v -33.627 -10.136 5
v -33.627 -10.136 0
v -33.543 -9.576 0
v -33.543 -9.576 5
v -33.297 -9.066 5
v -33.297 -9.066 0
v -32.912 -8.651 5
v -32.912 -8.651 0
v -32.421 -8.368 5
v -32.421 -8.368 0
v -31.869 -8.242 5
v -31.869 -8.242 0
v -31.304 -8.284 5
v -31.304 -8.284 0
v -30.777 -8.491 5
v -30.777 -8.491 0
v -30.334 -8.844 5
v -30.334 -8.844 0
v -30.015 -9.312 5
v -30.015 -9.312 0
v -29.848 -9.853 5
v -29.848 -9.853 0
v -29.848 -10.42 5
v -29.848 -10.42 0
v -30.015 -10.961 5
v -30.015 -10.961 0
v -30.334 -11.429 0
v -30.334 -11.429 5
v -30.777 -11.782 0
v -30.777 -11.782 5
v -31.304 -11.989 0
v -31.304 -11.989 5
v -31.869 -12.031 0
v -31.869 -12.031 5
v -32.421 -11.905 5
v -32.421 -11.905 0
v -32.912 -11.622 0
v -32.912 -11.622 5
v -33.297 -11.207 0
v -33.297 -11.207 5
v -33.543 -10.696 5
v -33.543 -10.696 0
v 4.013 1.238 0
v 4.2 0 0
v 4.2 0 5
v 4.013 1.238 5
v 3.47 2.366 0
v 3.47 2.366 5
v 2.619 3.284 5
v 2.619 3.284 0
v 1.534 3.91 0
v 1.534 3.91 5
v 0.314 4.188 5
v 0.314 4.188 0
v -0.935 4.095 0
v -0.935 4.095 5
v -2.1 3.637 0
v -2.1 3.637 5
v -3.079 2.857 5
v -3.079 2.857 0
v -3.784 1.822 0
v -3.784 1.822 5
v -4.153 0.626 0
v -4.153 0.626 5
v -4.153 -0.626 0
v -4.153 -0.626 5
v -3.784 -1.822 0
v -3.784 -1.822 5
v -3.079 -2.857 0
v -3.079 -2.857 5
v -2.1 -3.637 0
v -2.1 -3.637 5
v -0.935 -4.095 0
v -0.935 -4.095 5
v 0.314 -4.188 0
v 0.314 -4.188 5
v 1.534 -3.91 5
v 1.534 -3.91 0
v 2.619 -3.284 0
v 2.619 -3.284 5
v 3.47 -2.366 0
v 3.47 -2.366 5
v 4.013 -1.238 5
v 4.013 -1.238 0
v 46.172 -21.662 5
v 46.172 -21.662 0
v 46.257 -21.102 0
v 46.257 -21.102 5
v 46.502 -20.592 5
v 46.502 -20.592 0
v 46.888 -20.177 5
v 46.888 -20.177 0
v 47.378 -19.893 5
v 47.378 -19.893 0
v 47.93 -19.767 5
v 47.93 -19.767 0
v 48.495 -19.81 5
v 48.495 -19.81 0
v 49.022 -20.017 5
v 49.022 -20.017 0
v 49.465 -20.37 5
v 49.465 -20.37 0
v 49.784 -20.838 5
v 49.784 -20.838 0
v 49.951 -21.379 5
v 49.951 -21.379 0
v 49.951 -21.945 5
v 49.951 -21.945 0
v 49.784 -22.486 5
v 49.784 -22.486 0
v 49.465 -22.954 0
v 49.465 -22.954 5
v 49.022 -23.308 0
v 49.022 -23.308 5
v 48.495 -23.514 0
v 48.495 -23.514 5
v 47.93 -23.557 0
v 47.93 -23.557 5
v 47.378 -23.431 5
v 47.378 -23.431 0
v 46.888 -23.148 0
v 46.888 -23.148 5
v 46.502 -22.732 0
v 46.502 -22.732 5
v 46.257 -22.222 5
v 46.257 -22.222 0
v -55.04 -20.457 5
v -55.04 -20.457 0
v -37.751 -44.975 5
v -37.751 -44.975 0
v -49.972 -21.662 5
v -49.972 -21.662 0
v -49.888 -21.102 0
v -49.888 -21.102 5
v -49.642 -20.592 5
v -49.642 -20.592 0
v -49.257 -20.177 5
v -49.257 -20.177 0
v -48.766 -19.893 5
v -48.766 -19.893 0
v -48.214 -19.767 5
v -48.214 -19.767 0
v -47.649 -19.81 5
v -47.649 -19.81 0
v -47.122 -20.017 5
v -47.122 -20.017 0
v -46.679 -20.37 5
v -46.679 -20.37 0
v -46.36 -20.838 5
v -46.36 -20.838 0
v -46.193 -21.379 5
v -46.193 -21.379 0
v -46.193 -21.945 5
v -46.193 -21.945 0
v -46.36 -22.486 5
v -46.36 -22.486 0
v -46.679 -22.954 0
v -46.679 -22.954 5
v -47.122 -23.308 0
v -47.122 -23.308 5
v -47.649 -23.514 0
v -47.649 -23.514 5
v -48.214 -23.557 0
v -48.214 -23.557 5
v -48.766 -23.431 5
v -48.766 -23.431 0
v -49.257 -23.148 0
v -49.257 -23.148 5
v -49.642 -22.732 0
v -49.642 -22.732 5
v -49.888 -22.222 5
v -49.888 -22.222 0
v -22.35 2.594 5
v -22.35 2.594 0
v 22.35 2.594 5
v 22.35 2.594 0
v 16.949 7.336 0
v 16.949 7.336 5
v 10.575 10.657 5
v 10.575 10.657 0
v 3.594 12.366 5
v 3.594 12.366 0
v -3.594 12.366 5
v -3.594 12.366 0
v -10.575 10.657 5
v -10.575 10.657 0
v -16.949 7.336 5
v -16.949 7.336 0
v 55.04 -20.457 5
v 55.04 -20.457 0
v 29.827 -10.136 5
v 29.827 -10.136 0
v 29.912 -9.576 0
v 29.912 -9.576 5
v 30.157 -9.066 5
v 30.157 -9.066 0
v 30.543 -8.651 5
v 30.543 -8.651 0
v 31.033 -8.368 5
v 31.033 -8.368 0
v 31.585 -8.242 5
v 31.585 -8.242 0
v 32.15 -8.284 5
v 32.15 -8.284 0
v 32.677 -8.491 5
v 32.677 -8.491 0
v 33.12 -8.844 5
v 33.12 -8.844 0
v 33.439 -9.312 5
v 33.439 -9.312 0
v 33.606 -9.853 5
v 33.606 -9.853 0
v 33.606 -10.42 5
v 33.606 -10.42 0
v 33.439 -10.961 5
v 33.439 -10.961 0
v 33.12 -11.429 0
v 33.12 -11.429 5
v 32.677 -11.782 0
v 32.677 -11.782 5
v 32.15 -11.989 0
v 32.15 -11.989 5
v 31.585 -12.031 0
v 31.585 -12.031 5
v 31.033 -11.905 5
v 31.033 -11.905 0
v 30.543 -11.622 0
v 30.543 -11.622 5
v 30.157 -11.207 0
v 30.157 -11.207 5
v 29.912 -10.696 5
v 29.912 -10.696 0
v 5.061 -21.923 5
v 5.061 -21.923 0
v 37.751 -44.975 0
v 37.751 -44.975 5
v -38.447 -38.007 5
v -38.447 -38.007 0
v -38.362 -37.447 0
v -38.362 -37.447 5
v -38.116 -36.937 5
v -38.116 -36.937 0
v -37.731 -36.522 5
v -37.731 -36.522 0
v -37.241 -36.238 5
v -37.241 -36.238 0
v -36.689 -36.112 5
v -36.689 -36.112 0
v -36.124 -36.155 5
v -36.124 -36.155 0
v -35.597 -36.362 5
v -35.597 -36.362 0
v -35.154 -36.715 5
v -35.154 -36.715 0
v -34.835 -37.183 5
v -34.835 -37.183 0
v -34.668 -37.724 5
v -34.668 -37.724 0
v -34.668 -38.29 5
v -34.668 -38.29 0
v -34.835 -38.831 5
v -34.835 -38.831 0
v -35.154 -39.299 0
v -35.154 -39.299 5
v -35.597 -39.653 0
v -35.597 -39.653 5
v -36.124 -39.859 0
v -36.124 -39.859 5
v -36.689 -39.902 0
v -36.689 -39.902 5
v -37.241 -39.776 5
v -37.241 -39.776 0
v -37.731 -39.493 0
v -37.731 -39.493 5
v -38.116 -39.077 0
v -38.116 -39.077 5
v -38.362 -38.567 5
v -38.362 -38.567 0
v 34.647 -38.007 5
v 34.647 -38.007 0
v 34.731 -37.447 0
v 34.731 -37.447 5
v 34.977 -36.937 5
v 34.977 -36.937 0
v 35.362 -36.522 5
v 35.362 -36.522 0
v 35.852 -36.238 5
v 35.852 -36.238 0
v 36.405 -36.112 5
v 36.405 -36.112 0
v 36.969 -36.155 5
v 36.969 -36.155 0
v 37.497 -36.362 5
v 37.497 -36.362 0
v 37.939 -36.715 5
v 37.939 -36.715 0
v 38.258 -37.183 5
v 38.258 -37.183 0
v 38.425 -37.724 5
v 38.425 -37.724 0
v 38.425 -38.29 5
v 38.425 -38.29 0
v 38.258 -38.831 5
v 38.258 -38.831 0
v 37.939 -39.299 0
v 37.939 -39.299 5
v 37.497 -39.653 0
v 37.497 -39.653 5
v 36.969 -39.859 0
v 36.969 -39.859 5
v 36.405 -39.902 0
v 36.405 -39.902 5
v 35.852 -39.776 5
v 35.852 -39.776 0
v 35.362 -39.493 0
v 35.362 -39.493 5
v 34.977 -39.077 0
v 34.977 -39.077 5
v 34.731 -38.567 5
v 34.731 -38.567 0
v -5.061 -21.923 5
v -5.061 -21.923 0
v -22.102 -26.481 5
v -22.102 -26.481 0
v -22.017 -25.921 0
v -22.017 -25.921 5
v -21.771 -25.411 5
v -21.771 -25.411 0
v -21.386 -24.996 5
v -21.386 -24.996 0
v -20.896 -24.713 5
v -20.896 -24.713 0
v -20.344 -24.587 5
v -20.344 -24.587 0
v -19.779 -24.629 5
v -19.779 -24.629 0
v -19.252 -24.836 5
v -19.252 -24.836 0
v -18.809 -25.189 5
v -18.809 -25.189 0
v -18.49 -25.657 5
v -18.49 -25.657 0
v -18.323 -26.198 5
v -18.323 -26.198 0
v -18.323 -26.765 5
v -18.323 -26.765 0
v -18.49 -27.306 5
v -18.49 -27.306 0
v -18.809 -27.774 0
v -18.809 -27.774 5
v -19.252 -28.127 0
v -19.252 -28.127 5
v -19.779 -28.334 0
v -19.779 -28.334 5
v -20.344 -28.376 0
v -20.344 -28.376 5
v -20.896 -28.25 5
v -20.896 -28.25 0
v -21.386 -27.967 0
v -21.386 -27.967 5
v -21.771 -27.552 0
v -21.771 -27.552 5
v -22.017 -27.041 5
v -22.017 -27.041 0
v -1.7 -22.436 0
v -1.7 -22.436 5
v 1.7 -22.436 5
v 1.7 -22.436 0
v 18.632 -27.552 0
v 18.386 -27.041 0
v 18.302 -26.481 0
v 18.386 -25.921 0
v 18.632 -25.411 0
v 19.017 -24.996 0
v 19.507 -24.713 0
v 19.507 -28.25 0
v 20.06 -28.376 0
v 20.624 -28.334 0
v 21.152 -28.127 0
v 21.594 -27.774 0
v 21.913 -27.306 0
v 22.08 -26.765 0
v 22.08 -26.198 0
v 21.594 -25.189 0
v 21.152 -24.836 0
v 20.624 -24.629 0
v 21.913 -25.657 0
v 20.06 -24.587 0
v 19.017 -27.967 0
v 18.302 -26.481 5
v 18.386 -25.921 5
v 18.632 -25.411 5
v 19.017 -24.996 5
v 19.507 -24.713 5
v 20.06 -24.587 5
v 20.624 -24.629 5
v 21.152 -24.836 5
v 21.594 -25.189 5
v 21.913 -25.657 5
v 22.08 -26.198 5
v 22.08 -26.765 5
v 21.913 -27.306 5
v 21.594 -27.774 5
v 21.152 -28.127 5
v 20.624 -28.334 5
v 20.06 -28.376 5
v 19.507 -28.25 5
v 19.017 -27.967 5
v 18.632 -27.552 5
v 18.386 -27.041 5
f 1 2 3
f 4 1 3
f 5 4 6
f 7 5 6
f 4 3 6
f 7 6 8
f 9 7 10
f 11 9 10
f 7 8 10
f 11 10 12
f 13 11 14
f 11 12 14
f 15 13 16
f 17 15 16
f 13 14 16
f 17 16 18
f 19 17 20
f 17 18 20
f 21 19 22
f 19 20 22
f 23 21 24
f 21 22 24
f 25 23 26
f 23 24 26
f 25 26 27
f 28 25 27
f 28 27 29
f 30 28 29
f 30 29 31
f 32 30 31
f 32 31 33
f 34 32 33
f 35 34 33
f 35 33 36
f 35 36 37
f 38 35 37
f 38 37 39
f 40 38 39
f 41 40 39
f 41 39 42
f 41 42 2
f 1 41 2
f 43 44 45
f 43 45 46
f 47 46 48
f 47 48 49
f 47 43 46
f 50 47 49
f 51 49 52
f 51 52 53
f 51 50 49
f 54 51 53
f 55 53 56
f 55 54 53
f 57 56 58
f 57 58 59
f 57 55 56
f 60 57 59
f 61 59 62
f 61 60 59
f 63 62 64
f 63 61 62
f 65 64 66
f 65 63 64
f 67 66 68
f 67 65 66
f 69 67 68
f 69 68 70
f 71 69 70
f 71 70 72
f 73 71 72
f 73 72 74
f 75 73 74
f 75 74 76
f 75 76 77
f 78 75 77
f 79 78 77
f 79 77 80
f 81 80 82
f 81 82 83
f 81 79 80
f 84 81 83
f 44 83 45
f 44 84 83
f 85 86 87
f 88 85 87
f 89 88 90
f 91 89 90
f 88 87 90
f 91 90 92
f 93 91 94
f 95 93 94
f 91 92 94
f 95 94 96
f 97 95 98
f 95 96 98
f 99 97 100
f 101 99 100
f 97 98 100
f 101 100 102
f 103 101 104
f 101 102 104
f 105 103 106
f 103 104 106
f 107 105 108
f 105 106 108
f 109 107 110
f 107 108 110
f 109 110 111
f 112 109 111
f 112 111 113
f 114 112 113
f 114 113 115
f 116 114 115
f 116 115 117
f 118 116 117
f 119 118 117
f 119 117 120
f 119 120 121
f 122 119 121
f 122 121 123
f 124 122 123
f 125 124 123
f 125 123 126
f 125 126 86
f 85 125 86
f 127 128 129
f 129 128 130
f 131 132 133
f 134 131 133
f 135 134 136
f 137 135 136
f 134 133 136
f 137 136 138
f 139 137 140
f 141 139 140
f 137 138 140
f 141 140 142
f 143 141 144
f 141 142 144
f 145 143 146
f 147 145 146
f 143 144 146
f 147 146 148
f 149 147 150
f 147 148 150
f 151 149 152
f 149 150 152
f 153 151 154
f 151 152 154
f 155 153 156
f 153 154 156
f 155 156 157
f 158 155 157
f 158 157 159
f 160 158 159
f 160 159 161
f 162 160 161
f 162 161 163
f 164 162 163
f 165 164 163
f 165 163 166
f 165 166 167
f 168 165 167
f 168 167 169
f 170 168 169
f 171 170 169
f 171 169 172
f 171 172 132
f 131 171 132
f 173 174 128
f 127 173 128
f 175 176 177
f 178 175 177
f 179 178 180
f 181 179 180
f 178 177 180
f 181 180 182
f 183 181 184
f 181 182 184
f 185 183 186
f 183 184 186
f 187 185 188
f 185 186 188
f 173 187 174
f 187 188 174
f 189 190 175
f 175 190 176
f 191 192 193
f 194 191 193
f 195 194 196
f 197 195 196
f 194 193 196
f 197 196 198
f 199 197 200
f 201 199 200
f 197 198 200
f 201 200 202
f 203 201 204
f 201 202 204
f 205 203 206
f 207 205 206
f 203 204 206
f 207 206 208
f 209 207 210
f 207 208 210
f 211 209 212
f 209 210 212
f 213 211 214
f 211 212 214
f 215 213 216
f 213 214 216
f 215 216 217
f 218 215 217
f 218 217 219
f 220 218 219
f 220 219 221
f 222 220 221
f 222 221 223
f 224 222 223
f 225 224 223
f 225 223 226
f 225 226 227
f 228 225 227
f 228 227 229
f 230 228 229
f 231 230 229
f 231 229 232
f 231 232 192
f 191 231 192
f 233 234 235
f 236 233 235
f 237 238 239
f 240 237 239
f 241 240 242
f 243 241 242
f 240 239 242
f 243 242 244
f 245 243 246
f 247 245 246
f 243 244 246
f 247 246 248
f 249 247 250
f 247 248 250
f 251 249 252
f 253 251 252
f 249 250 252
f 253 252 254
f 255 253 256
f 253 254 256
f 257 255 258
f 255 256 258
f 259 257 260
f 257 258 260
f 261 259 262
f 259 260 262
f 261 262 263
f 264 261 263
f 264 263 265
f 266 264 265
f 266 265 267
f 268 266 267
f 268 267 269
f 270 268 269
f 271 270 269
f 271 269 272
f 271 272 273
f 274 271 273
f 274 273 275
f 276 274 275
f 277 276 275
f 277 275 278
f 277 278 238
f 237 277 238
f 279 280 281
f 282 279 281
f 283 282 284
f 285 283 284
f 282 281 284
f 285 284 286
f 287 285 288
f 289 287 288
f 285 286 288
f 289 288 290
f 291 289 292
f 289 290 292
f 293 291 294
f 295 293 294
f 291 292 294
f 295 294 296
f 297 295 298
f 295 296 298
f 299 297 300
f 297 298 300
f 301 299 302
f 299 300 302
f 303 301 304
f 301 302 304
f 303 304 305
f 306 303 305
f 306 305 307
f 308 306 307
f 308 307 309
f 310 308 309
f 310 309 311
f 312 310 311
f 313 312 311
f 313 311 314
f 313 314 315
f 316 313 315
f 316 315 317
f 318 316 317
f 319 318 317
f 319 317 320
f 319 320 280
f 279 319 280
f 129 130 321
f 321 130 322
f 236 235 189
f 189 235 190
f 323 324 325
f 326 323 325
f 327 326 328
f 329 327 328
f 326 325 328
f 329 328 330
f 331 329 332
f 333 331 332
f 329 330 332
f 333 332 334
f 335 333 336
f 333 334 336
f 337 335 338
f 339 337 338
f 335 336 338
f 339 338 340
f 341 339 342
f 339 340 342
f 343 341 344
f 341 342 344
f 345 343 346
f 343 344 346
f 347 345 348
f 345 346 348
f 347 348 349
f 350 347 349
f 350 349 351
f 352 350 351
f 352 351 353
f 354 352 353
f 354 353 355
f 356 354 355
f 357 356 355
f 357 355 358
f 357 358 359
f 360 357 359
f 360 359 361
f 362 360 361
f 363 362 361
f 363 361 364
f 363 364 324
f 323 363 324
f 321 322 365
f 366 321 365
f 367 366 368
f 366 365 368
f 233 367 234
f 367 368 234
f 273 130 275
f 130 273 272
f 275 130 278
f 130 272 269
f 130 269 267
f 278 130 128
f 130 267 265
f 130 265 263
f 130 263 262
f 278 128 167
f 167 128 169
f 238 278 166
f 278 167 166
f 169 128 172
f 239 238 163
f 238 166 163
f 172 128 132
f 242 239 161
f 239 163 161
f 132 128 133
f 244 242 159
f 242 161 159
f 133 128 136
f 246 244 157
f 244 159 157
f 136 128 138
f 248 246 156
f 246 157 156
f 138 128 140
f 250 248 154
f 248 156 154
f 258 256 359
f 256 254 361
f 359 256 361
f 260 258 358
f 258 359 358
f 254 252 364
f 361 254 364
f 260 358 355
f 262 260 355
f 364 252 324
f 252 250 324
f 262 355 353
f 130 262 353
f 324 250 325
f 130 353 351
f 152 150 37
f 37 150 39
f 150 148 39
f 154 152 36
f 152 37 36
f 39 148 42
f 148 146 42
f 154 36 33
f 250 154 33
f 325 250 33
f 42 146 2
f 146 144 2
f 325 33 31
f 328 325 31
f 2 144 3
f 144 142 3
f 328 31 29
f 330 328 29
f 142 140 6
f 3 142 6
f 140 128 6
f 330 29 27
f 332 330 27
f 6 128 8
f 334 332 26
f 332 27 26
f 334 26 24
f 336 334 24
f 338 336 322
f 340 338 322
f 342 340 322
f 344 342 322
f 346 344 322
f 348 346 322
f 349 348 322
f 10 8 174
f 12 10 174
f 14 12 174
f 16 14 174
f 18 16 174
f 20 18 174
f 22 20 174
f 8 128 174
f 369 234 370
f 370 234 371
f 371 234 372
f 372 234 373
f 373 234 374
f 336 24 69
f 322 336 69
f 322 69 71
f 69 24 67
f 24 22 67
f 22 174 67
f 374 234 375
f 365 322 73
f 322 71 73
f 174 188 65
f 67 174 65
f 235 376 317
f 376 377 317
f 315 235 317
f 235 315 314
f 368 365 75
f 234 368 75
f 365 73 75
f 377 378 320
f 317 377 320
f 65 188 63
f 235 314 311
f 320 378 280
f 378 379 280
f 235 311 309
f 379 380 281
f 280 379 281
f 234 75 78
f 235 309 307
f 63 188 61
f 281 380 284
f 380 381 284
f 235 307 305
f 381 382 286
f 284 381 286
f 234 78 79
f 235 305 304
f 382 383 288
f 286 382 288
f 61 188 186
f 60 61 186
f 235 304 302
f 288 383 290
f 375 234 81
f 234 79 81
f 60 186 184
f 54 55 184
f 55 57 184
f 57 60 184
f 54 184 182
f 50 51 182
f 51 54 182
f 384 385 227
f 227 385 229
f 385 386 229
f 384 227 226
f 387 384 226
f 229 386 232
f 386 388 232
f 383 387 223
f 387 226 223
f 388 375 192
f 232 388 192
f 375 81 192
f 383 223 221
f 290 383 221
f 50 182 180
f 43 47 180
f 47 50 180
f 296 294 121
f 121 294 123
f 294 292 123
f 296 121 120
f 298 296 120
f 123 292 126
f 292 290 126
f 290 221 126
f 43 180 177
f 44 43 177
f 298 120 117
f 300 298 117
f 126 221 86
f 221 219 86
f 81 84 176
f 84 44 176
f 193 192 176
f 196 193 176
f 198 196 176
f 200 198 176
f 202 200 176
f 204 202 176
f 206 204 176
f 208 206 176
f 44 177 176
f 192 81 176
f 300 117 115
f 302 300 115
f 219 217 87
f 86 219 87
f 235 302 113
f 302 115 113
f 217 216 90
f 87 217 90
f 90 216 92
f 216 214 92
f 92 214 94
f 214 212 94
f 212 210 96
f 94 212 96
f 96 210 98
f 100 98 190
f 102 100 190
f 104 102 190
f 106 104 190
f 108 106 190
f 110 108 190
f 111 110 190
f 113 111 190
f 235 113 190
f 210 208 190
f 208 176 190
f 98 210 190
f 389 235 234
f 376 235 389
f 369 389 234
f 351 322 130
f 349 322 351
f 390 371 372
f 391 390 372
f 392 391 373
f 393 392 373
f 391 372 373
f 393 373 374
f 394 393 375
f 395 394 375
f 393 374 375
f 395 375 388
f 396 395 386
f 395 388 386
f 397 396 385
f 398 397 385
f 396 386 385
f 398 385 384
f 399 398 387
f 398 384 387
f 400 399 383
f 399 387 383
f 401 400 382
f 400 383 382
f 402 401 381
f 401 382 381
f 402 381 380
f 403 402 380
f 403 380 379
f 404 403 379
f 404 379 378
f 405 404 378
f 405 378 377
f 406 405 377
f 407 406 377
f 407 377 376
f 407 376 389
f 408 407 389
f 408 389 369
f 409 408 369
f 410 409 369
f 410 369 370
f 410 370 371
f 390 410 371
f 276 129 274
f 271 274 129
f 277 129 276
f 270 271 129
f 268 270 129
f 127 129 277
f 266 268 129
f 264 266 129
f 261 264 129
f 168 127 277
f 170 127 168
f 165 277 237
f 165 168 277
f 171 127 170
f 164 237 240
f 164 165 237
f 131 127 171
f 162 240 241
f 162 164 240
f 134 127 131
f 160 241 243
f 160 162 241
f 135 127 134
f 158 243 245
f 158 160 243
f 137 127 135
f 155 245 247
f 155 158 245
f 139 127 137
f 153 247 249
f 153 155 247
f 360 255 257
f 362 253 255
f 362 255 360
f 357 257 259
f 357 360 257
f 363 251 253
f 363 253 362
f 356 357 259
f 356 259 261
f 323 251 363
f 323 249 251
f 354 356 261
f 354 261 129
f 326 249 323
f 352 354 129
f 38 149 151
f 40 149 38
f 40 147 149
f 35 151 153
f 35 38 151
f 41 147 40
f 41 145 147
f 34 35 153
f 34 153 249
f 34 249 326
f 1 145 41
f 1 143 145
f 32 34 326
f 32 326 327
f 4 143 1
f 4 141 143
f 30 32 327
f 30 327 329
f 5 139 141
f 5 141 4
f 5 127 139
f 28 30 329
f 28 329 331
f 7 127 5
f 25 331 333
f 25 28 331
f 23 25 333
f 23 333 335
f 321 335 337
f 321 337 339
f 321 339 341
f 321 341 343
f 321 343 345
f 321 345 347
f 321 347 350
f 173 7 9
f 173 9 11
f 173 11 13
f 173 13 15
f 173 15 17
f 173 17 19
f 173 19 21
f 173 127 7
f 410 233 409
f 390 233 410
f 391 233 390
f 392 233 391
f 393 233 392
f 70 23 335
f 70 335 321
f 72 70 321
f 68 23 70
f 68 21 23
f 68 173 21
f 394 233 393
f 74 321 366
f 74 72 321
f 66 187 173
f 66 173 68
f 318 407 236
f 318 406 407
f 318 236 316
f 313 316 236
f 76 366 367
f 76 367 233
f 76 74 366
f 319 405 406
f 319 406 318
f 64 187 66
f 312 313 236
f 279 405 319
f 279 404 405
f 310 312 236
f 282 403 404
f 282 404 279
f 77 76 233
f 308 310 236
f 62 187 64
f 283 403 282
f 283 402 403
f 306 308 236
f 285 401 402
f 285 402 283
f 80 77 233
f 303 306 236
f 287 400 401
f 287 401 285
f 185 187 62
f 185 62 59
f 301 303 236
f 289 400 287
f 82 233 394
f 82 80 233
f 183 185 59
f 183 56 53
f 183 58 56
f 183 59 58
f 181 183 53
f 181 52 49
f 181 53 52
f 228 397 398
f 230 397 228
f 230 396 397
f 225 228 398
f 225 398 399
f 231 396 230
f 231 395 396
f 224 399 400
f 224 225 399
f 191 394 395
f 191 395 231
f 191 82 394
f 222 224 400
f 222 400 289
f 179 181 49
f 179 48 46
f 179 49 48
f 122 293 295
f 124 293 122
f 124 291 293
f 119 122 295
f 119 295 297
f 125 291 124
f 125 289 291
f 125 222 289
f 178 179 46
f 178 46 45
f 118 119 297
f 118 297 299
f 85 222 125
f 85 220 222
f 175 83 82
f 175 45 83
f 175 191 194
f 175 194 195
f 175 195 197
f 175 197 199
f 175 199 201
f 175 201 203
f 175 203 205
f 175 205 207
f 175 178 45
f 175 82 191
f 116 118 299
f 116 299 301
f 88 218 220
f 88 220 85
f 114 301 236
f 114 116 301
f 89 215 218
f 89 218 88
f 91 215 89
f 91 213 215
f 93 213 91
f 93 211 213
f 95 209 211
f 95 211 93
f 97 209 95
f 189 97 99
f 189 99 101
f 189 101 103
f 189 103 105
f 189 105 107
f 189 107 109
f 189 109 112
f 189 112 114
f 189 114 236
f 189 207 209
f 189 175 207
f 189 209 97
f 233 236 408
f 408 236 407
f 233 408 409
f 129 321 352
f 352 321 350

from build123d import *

# Parameters (mm, degrees)
SKETCH2_R            = 4.2
BOSS_EXTRUDE1_DEPTH  = 5
M3_CLEARANCE_HOLE1_D = 3.8


with BuildPart() as part:
    # Sketch2 → Boss-Extrude1 (new body)
    with BuildSketch(Plane.XY):
        with BuildLine():
            Line((5.061398723, -21.923326458), (37.751345105, -44.974734343))
            Line((37.751345105, -44.974734343), (55.039901019, -20.457274556))
            Line((55.039901019, -20.457274556), (22.349954637, 2.594133329))
            ThreePointArc((22.349954637, 2.594133329), (0, 12.582148727), (-22.349954637, 2.594133329))
            Line((-22.349954637, 2.594133329), (-55.039901019, -20.457274556))
            Line((-55.039901019, -20.457274556), (-37.751345105, -44.974734343))
            Line((-37.751345105, -44.974734343), (-5.061398723, -21.923326458))
            ThreePointArc((-5.061398723, -21.923326458), (0, -22.5), (5.061398723, -21.923326458))
        make_face()
        Circle(SKETCH2_R, mode=Mode.SUBTRACT)
    extrude(amount=BOSS_EXTRUDE1_DEPTH)

    # M3 Clearance Hole1 (through all)
    with Locations(Plane.XY.offset(5)):
        with Locations((-31.727258545, -10.136387926), (-20.201554602, -26.481361117), (-36.546527793, -38.00706506), (-48.072231736, -21.662091868), (31.727258545, -10.136387926), (48.072231736, -21.662091868), (20.201554544, -26.481361199), (36.546527736, -38.007065141)):
            Hole(M3_CLEARANCE_HOLE1_D / 2)


solid = part.part
